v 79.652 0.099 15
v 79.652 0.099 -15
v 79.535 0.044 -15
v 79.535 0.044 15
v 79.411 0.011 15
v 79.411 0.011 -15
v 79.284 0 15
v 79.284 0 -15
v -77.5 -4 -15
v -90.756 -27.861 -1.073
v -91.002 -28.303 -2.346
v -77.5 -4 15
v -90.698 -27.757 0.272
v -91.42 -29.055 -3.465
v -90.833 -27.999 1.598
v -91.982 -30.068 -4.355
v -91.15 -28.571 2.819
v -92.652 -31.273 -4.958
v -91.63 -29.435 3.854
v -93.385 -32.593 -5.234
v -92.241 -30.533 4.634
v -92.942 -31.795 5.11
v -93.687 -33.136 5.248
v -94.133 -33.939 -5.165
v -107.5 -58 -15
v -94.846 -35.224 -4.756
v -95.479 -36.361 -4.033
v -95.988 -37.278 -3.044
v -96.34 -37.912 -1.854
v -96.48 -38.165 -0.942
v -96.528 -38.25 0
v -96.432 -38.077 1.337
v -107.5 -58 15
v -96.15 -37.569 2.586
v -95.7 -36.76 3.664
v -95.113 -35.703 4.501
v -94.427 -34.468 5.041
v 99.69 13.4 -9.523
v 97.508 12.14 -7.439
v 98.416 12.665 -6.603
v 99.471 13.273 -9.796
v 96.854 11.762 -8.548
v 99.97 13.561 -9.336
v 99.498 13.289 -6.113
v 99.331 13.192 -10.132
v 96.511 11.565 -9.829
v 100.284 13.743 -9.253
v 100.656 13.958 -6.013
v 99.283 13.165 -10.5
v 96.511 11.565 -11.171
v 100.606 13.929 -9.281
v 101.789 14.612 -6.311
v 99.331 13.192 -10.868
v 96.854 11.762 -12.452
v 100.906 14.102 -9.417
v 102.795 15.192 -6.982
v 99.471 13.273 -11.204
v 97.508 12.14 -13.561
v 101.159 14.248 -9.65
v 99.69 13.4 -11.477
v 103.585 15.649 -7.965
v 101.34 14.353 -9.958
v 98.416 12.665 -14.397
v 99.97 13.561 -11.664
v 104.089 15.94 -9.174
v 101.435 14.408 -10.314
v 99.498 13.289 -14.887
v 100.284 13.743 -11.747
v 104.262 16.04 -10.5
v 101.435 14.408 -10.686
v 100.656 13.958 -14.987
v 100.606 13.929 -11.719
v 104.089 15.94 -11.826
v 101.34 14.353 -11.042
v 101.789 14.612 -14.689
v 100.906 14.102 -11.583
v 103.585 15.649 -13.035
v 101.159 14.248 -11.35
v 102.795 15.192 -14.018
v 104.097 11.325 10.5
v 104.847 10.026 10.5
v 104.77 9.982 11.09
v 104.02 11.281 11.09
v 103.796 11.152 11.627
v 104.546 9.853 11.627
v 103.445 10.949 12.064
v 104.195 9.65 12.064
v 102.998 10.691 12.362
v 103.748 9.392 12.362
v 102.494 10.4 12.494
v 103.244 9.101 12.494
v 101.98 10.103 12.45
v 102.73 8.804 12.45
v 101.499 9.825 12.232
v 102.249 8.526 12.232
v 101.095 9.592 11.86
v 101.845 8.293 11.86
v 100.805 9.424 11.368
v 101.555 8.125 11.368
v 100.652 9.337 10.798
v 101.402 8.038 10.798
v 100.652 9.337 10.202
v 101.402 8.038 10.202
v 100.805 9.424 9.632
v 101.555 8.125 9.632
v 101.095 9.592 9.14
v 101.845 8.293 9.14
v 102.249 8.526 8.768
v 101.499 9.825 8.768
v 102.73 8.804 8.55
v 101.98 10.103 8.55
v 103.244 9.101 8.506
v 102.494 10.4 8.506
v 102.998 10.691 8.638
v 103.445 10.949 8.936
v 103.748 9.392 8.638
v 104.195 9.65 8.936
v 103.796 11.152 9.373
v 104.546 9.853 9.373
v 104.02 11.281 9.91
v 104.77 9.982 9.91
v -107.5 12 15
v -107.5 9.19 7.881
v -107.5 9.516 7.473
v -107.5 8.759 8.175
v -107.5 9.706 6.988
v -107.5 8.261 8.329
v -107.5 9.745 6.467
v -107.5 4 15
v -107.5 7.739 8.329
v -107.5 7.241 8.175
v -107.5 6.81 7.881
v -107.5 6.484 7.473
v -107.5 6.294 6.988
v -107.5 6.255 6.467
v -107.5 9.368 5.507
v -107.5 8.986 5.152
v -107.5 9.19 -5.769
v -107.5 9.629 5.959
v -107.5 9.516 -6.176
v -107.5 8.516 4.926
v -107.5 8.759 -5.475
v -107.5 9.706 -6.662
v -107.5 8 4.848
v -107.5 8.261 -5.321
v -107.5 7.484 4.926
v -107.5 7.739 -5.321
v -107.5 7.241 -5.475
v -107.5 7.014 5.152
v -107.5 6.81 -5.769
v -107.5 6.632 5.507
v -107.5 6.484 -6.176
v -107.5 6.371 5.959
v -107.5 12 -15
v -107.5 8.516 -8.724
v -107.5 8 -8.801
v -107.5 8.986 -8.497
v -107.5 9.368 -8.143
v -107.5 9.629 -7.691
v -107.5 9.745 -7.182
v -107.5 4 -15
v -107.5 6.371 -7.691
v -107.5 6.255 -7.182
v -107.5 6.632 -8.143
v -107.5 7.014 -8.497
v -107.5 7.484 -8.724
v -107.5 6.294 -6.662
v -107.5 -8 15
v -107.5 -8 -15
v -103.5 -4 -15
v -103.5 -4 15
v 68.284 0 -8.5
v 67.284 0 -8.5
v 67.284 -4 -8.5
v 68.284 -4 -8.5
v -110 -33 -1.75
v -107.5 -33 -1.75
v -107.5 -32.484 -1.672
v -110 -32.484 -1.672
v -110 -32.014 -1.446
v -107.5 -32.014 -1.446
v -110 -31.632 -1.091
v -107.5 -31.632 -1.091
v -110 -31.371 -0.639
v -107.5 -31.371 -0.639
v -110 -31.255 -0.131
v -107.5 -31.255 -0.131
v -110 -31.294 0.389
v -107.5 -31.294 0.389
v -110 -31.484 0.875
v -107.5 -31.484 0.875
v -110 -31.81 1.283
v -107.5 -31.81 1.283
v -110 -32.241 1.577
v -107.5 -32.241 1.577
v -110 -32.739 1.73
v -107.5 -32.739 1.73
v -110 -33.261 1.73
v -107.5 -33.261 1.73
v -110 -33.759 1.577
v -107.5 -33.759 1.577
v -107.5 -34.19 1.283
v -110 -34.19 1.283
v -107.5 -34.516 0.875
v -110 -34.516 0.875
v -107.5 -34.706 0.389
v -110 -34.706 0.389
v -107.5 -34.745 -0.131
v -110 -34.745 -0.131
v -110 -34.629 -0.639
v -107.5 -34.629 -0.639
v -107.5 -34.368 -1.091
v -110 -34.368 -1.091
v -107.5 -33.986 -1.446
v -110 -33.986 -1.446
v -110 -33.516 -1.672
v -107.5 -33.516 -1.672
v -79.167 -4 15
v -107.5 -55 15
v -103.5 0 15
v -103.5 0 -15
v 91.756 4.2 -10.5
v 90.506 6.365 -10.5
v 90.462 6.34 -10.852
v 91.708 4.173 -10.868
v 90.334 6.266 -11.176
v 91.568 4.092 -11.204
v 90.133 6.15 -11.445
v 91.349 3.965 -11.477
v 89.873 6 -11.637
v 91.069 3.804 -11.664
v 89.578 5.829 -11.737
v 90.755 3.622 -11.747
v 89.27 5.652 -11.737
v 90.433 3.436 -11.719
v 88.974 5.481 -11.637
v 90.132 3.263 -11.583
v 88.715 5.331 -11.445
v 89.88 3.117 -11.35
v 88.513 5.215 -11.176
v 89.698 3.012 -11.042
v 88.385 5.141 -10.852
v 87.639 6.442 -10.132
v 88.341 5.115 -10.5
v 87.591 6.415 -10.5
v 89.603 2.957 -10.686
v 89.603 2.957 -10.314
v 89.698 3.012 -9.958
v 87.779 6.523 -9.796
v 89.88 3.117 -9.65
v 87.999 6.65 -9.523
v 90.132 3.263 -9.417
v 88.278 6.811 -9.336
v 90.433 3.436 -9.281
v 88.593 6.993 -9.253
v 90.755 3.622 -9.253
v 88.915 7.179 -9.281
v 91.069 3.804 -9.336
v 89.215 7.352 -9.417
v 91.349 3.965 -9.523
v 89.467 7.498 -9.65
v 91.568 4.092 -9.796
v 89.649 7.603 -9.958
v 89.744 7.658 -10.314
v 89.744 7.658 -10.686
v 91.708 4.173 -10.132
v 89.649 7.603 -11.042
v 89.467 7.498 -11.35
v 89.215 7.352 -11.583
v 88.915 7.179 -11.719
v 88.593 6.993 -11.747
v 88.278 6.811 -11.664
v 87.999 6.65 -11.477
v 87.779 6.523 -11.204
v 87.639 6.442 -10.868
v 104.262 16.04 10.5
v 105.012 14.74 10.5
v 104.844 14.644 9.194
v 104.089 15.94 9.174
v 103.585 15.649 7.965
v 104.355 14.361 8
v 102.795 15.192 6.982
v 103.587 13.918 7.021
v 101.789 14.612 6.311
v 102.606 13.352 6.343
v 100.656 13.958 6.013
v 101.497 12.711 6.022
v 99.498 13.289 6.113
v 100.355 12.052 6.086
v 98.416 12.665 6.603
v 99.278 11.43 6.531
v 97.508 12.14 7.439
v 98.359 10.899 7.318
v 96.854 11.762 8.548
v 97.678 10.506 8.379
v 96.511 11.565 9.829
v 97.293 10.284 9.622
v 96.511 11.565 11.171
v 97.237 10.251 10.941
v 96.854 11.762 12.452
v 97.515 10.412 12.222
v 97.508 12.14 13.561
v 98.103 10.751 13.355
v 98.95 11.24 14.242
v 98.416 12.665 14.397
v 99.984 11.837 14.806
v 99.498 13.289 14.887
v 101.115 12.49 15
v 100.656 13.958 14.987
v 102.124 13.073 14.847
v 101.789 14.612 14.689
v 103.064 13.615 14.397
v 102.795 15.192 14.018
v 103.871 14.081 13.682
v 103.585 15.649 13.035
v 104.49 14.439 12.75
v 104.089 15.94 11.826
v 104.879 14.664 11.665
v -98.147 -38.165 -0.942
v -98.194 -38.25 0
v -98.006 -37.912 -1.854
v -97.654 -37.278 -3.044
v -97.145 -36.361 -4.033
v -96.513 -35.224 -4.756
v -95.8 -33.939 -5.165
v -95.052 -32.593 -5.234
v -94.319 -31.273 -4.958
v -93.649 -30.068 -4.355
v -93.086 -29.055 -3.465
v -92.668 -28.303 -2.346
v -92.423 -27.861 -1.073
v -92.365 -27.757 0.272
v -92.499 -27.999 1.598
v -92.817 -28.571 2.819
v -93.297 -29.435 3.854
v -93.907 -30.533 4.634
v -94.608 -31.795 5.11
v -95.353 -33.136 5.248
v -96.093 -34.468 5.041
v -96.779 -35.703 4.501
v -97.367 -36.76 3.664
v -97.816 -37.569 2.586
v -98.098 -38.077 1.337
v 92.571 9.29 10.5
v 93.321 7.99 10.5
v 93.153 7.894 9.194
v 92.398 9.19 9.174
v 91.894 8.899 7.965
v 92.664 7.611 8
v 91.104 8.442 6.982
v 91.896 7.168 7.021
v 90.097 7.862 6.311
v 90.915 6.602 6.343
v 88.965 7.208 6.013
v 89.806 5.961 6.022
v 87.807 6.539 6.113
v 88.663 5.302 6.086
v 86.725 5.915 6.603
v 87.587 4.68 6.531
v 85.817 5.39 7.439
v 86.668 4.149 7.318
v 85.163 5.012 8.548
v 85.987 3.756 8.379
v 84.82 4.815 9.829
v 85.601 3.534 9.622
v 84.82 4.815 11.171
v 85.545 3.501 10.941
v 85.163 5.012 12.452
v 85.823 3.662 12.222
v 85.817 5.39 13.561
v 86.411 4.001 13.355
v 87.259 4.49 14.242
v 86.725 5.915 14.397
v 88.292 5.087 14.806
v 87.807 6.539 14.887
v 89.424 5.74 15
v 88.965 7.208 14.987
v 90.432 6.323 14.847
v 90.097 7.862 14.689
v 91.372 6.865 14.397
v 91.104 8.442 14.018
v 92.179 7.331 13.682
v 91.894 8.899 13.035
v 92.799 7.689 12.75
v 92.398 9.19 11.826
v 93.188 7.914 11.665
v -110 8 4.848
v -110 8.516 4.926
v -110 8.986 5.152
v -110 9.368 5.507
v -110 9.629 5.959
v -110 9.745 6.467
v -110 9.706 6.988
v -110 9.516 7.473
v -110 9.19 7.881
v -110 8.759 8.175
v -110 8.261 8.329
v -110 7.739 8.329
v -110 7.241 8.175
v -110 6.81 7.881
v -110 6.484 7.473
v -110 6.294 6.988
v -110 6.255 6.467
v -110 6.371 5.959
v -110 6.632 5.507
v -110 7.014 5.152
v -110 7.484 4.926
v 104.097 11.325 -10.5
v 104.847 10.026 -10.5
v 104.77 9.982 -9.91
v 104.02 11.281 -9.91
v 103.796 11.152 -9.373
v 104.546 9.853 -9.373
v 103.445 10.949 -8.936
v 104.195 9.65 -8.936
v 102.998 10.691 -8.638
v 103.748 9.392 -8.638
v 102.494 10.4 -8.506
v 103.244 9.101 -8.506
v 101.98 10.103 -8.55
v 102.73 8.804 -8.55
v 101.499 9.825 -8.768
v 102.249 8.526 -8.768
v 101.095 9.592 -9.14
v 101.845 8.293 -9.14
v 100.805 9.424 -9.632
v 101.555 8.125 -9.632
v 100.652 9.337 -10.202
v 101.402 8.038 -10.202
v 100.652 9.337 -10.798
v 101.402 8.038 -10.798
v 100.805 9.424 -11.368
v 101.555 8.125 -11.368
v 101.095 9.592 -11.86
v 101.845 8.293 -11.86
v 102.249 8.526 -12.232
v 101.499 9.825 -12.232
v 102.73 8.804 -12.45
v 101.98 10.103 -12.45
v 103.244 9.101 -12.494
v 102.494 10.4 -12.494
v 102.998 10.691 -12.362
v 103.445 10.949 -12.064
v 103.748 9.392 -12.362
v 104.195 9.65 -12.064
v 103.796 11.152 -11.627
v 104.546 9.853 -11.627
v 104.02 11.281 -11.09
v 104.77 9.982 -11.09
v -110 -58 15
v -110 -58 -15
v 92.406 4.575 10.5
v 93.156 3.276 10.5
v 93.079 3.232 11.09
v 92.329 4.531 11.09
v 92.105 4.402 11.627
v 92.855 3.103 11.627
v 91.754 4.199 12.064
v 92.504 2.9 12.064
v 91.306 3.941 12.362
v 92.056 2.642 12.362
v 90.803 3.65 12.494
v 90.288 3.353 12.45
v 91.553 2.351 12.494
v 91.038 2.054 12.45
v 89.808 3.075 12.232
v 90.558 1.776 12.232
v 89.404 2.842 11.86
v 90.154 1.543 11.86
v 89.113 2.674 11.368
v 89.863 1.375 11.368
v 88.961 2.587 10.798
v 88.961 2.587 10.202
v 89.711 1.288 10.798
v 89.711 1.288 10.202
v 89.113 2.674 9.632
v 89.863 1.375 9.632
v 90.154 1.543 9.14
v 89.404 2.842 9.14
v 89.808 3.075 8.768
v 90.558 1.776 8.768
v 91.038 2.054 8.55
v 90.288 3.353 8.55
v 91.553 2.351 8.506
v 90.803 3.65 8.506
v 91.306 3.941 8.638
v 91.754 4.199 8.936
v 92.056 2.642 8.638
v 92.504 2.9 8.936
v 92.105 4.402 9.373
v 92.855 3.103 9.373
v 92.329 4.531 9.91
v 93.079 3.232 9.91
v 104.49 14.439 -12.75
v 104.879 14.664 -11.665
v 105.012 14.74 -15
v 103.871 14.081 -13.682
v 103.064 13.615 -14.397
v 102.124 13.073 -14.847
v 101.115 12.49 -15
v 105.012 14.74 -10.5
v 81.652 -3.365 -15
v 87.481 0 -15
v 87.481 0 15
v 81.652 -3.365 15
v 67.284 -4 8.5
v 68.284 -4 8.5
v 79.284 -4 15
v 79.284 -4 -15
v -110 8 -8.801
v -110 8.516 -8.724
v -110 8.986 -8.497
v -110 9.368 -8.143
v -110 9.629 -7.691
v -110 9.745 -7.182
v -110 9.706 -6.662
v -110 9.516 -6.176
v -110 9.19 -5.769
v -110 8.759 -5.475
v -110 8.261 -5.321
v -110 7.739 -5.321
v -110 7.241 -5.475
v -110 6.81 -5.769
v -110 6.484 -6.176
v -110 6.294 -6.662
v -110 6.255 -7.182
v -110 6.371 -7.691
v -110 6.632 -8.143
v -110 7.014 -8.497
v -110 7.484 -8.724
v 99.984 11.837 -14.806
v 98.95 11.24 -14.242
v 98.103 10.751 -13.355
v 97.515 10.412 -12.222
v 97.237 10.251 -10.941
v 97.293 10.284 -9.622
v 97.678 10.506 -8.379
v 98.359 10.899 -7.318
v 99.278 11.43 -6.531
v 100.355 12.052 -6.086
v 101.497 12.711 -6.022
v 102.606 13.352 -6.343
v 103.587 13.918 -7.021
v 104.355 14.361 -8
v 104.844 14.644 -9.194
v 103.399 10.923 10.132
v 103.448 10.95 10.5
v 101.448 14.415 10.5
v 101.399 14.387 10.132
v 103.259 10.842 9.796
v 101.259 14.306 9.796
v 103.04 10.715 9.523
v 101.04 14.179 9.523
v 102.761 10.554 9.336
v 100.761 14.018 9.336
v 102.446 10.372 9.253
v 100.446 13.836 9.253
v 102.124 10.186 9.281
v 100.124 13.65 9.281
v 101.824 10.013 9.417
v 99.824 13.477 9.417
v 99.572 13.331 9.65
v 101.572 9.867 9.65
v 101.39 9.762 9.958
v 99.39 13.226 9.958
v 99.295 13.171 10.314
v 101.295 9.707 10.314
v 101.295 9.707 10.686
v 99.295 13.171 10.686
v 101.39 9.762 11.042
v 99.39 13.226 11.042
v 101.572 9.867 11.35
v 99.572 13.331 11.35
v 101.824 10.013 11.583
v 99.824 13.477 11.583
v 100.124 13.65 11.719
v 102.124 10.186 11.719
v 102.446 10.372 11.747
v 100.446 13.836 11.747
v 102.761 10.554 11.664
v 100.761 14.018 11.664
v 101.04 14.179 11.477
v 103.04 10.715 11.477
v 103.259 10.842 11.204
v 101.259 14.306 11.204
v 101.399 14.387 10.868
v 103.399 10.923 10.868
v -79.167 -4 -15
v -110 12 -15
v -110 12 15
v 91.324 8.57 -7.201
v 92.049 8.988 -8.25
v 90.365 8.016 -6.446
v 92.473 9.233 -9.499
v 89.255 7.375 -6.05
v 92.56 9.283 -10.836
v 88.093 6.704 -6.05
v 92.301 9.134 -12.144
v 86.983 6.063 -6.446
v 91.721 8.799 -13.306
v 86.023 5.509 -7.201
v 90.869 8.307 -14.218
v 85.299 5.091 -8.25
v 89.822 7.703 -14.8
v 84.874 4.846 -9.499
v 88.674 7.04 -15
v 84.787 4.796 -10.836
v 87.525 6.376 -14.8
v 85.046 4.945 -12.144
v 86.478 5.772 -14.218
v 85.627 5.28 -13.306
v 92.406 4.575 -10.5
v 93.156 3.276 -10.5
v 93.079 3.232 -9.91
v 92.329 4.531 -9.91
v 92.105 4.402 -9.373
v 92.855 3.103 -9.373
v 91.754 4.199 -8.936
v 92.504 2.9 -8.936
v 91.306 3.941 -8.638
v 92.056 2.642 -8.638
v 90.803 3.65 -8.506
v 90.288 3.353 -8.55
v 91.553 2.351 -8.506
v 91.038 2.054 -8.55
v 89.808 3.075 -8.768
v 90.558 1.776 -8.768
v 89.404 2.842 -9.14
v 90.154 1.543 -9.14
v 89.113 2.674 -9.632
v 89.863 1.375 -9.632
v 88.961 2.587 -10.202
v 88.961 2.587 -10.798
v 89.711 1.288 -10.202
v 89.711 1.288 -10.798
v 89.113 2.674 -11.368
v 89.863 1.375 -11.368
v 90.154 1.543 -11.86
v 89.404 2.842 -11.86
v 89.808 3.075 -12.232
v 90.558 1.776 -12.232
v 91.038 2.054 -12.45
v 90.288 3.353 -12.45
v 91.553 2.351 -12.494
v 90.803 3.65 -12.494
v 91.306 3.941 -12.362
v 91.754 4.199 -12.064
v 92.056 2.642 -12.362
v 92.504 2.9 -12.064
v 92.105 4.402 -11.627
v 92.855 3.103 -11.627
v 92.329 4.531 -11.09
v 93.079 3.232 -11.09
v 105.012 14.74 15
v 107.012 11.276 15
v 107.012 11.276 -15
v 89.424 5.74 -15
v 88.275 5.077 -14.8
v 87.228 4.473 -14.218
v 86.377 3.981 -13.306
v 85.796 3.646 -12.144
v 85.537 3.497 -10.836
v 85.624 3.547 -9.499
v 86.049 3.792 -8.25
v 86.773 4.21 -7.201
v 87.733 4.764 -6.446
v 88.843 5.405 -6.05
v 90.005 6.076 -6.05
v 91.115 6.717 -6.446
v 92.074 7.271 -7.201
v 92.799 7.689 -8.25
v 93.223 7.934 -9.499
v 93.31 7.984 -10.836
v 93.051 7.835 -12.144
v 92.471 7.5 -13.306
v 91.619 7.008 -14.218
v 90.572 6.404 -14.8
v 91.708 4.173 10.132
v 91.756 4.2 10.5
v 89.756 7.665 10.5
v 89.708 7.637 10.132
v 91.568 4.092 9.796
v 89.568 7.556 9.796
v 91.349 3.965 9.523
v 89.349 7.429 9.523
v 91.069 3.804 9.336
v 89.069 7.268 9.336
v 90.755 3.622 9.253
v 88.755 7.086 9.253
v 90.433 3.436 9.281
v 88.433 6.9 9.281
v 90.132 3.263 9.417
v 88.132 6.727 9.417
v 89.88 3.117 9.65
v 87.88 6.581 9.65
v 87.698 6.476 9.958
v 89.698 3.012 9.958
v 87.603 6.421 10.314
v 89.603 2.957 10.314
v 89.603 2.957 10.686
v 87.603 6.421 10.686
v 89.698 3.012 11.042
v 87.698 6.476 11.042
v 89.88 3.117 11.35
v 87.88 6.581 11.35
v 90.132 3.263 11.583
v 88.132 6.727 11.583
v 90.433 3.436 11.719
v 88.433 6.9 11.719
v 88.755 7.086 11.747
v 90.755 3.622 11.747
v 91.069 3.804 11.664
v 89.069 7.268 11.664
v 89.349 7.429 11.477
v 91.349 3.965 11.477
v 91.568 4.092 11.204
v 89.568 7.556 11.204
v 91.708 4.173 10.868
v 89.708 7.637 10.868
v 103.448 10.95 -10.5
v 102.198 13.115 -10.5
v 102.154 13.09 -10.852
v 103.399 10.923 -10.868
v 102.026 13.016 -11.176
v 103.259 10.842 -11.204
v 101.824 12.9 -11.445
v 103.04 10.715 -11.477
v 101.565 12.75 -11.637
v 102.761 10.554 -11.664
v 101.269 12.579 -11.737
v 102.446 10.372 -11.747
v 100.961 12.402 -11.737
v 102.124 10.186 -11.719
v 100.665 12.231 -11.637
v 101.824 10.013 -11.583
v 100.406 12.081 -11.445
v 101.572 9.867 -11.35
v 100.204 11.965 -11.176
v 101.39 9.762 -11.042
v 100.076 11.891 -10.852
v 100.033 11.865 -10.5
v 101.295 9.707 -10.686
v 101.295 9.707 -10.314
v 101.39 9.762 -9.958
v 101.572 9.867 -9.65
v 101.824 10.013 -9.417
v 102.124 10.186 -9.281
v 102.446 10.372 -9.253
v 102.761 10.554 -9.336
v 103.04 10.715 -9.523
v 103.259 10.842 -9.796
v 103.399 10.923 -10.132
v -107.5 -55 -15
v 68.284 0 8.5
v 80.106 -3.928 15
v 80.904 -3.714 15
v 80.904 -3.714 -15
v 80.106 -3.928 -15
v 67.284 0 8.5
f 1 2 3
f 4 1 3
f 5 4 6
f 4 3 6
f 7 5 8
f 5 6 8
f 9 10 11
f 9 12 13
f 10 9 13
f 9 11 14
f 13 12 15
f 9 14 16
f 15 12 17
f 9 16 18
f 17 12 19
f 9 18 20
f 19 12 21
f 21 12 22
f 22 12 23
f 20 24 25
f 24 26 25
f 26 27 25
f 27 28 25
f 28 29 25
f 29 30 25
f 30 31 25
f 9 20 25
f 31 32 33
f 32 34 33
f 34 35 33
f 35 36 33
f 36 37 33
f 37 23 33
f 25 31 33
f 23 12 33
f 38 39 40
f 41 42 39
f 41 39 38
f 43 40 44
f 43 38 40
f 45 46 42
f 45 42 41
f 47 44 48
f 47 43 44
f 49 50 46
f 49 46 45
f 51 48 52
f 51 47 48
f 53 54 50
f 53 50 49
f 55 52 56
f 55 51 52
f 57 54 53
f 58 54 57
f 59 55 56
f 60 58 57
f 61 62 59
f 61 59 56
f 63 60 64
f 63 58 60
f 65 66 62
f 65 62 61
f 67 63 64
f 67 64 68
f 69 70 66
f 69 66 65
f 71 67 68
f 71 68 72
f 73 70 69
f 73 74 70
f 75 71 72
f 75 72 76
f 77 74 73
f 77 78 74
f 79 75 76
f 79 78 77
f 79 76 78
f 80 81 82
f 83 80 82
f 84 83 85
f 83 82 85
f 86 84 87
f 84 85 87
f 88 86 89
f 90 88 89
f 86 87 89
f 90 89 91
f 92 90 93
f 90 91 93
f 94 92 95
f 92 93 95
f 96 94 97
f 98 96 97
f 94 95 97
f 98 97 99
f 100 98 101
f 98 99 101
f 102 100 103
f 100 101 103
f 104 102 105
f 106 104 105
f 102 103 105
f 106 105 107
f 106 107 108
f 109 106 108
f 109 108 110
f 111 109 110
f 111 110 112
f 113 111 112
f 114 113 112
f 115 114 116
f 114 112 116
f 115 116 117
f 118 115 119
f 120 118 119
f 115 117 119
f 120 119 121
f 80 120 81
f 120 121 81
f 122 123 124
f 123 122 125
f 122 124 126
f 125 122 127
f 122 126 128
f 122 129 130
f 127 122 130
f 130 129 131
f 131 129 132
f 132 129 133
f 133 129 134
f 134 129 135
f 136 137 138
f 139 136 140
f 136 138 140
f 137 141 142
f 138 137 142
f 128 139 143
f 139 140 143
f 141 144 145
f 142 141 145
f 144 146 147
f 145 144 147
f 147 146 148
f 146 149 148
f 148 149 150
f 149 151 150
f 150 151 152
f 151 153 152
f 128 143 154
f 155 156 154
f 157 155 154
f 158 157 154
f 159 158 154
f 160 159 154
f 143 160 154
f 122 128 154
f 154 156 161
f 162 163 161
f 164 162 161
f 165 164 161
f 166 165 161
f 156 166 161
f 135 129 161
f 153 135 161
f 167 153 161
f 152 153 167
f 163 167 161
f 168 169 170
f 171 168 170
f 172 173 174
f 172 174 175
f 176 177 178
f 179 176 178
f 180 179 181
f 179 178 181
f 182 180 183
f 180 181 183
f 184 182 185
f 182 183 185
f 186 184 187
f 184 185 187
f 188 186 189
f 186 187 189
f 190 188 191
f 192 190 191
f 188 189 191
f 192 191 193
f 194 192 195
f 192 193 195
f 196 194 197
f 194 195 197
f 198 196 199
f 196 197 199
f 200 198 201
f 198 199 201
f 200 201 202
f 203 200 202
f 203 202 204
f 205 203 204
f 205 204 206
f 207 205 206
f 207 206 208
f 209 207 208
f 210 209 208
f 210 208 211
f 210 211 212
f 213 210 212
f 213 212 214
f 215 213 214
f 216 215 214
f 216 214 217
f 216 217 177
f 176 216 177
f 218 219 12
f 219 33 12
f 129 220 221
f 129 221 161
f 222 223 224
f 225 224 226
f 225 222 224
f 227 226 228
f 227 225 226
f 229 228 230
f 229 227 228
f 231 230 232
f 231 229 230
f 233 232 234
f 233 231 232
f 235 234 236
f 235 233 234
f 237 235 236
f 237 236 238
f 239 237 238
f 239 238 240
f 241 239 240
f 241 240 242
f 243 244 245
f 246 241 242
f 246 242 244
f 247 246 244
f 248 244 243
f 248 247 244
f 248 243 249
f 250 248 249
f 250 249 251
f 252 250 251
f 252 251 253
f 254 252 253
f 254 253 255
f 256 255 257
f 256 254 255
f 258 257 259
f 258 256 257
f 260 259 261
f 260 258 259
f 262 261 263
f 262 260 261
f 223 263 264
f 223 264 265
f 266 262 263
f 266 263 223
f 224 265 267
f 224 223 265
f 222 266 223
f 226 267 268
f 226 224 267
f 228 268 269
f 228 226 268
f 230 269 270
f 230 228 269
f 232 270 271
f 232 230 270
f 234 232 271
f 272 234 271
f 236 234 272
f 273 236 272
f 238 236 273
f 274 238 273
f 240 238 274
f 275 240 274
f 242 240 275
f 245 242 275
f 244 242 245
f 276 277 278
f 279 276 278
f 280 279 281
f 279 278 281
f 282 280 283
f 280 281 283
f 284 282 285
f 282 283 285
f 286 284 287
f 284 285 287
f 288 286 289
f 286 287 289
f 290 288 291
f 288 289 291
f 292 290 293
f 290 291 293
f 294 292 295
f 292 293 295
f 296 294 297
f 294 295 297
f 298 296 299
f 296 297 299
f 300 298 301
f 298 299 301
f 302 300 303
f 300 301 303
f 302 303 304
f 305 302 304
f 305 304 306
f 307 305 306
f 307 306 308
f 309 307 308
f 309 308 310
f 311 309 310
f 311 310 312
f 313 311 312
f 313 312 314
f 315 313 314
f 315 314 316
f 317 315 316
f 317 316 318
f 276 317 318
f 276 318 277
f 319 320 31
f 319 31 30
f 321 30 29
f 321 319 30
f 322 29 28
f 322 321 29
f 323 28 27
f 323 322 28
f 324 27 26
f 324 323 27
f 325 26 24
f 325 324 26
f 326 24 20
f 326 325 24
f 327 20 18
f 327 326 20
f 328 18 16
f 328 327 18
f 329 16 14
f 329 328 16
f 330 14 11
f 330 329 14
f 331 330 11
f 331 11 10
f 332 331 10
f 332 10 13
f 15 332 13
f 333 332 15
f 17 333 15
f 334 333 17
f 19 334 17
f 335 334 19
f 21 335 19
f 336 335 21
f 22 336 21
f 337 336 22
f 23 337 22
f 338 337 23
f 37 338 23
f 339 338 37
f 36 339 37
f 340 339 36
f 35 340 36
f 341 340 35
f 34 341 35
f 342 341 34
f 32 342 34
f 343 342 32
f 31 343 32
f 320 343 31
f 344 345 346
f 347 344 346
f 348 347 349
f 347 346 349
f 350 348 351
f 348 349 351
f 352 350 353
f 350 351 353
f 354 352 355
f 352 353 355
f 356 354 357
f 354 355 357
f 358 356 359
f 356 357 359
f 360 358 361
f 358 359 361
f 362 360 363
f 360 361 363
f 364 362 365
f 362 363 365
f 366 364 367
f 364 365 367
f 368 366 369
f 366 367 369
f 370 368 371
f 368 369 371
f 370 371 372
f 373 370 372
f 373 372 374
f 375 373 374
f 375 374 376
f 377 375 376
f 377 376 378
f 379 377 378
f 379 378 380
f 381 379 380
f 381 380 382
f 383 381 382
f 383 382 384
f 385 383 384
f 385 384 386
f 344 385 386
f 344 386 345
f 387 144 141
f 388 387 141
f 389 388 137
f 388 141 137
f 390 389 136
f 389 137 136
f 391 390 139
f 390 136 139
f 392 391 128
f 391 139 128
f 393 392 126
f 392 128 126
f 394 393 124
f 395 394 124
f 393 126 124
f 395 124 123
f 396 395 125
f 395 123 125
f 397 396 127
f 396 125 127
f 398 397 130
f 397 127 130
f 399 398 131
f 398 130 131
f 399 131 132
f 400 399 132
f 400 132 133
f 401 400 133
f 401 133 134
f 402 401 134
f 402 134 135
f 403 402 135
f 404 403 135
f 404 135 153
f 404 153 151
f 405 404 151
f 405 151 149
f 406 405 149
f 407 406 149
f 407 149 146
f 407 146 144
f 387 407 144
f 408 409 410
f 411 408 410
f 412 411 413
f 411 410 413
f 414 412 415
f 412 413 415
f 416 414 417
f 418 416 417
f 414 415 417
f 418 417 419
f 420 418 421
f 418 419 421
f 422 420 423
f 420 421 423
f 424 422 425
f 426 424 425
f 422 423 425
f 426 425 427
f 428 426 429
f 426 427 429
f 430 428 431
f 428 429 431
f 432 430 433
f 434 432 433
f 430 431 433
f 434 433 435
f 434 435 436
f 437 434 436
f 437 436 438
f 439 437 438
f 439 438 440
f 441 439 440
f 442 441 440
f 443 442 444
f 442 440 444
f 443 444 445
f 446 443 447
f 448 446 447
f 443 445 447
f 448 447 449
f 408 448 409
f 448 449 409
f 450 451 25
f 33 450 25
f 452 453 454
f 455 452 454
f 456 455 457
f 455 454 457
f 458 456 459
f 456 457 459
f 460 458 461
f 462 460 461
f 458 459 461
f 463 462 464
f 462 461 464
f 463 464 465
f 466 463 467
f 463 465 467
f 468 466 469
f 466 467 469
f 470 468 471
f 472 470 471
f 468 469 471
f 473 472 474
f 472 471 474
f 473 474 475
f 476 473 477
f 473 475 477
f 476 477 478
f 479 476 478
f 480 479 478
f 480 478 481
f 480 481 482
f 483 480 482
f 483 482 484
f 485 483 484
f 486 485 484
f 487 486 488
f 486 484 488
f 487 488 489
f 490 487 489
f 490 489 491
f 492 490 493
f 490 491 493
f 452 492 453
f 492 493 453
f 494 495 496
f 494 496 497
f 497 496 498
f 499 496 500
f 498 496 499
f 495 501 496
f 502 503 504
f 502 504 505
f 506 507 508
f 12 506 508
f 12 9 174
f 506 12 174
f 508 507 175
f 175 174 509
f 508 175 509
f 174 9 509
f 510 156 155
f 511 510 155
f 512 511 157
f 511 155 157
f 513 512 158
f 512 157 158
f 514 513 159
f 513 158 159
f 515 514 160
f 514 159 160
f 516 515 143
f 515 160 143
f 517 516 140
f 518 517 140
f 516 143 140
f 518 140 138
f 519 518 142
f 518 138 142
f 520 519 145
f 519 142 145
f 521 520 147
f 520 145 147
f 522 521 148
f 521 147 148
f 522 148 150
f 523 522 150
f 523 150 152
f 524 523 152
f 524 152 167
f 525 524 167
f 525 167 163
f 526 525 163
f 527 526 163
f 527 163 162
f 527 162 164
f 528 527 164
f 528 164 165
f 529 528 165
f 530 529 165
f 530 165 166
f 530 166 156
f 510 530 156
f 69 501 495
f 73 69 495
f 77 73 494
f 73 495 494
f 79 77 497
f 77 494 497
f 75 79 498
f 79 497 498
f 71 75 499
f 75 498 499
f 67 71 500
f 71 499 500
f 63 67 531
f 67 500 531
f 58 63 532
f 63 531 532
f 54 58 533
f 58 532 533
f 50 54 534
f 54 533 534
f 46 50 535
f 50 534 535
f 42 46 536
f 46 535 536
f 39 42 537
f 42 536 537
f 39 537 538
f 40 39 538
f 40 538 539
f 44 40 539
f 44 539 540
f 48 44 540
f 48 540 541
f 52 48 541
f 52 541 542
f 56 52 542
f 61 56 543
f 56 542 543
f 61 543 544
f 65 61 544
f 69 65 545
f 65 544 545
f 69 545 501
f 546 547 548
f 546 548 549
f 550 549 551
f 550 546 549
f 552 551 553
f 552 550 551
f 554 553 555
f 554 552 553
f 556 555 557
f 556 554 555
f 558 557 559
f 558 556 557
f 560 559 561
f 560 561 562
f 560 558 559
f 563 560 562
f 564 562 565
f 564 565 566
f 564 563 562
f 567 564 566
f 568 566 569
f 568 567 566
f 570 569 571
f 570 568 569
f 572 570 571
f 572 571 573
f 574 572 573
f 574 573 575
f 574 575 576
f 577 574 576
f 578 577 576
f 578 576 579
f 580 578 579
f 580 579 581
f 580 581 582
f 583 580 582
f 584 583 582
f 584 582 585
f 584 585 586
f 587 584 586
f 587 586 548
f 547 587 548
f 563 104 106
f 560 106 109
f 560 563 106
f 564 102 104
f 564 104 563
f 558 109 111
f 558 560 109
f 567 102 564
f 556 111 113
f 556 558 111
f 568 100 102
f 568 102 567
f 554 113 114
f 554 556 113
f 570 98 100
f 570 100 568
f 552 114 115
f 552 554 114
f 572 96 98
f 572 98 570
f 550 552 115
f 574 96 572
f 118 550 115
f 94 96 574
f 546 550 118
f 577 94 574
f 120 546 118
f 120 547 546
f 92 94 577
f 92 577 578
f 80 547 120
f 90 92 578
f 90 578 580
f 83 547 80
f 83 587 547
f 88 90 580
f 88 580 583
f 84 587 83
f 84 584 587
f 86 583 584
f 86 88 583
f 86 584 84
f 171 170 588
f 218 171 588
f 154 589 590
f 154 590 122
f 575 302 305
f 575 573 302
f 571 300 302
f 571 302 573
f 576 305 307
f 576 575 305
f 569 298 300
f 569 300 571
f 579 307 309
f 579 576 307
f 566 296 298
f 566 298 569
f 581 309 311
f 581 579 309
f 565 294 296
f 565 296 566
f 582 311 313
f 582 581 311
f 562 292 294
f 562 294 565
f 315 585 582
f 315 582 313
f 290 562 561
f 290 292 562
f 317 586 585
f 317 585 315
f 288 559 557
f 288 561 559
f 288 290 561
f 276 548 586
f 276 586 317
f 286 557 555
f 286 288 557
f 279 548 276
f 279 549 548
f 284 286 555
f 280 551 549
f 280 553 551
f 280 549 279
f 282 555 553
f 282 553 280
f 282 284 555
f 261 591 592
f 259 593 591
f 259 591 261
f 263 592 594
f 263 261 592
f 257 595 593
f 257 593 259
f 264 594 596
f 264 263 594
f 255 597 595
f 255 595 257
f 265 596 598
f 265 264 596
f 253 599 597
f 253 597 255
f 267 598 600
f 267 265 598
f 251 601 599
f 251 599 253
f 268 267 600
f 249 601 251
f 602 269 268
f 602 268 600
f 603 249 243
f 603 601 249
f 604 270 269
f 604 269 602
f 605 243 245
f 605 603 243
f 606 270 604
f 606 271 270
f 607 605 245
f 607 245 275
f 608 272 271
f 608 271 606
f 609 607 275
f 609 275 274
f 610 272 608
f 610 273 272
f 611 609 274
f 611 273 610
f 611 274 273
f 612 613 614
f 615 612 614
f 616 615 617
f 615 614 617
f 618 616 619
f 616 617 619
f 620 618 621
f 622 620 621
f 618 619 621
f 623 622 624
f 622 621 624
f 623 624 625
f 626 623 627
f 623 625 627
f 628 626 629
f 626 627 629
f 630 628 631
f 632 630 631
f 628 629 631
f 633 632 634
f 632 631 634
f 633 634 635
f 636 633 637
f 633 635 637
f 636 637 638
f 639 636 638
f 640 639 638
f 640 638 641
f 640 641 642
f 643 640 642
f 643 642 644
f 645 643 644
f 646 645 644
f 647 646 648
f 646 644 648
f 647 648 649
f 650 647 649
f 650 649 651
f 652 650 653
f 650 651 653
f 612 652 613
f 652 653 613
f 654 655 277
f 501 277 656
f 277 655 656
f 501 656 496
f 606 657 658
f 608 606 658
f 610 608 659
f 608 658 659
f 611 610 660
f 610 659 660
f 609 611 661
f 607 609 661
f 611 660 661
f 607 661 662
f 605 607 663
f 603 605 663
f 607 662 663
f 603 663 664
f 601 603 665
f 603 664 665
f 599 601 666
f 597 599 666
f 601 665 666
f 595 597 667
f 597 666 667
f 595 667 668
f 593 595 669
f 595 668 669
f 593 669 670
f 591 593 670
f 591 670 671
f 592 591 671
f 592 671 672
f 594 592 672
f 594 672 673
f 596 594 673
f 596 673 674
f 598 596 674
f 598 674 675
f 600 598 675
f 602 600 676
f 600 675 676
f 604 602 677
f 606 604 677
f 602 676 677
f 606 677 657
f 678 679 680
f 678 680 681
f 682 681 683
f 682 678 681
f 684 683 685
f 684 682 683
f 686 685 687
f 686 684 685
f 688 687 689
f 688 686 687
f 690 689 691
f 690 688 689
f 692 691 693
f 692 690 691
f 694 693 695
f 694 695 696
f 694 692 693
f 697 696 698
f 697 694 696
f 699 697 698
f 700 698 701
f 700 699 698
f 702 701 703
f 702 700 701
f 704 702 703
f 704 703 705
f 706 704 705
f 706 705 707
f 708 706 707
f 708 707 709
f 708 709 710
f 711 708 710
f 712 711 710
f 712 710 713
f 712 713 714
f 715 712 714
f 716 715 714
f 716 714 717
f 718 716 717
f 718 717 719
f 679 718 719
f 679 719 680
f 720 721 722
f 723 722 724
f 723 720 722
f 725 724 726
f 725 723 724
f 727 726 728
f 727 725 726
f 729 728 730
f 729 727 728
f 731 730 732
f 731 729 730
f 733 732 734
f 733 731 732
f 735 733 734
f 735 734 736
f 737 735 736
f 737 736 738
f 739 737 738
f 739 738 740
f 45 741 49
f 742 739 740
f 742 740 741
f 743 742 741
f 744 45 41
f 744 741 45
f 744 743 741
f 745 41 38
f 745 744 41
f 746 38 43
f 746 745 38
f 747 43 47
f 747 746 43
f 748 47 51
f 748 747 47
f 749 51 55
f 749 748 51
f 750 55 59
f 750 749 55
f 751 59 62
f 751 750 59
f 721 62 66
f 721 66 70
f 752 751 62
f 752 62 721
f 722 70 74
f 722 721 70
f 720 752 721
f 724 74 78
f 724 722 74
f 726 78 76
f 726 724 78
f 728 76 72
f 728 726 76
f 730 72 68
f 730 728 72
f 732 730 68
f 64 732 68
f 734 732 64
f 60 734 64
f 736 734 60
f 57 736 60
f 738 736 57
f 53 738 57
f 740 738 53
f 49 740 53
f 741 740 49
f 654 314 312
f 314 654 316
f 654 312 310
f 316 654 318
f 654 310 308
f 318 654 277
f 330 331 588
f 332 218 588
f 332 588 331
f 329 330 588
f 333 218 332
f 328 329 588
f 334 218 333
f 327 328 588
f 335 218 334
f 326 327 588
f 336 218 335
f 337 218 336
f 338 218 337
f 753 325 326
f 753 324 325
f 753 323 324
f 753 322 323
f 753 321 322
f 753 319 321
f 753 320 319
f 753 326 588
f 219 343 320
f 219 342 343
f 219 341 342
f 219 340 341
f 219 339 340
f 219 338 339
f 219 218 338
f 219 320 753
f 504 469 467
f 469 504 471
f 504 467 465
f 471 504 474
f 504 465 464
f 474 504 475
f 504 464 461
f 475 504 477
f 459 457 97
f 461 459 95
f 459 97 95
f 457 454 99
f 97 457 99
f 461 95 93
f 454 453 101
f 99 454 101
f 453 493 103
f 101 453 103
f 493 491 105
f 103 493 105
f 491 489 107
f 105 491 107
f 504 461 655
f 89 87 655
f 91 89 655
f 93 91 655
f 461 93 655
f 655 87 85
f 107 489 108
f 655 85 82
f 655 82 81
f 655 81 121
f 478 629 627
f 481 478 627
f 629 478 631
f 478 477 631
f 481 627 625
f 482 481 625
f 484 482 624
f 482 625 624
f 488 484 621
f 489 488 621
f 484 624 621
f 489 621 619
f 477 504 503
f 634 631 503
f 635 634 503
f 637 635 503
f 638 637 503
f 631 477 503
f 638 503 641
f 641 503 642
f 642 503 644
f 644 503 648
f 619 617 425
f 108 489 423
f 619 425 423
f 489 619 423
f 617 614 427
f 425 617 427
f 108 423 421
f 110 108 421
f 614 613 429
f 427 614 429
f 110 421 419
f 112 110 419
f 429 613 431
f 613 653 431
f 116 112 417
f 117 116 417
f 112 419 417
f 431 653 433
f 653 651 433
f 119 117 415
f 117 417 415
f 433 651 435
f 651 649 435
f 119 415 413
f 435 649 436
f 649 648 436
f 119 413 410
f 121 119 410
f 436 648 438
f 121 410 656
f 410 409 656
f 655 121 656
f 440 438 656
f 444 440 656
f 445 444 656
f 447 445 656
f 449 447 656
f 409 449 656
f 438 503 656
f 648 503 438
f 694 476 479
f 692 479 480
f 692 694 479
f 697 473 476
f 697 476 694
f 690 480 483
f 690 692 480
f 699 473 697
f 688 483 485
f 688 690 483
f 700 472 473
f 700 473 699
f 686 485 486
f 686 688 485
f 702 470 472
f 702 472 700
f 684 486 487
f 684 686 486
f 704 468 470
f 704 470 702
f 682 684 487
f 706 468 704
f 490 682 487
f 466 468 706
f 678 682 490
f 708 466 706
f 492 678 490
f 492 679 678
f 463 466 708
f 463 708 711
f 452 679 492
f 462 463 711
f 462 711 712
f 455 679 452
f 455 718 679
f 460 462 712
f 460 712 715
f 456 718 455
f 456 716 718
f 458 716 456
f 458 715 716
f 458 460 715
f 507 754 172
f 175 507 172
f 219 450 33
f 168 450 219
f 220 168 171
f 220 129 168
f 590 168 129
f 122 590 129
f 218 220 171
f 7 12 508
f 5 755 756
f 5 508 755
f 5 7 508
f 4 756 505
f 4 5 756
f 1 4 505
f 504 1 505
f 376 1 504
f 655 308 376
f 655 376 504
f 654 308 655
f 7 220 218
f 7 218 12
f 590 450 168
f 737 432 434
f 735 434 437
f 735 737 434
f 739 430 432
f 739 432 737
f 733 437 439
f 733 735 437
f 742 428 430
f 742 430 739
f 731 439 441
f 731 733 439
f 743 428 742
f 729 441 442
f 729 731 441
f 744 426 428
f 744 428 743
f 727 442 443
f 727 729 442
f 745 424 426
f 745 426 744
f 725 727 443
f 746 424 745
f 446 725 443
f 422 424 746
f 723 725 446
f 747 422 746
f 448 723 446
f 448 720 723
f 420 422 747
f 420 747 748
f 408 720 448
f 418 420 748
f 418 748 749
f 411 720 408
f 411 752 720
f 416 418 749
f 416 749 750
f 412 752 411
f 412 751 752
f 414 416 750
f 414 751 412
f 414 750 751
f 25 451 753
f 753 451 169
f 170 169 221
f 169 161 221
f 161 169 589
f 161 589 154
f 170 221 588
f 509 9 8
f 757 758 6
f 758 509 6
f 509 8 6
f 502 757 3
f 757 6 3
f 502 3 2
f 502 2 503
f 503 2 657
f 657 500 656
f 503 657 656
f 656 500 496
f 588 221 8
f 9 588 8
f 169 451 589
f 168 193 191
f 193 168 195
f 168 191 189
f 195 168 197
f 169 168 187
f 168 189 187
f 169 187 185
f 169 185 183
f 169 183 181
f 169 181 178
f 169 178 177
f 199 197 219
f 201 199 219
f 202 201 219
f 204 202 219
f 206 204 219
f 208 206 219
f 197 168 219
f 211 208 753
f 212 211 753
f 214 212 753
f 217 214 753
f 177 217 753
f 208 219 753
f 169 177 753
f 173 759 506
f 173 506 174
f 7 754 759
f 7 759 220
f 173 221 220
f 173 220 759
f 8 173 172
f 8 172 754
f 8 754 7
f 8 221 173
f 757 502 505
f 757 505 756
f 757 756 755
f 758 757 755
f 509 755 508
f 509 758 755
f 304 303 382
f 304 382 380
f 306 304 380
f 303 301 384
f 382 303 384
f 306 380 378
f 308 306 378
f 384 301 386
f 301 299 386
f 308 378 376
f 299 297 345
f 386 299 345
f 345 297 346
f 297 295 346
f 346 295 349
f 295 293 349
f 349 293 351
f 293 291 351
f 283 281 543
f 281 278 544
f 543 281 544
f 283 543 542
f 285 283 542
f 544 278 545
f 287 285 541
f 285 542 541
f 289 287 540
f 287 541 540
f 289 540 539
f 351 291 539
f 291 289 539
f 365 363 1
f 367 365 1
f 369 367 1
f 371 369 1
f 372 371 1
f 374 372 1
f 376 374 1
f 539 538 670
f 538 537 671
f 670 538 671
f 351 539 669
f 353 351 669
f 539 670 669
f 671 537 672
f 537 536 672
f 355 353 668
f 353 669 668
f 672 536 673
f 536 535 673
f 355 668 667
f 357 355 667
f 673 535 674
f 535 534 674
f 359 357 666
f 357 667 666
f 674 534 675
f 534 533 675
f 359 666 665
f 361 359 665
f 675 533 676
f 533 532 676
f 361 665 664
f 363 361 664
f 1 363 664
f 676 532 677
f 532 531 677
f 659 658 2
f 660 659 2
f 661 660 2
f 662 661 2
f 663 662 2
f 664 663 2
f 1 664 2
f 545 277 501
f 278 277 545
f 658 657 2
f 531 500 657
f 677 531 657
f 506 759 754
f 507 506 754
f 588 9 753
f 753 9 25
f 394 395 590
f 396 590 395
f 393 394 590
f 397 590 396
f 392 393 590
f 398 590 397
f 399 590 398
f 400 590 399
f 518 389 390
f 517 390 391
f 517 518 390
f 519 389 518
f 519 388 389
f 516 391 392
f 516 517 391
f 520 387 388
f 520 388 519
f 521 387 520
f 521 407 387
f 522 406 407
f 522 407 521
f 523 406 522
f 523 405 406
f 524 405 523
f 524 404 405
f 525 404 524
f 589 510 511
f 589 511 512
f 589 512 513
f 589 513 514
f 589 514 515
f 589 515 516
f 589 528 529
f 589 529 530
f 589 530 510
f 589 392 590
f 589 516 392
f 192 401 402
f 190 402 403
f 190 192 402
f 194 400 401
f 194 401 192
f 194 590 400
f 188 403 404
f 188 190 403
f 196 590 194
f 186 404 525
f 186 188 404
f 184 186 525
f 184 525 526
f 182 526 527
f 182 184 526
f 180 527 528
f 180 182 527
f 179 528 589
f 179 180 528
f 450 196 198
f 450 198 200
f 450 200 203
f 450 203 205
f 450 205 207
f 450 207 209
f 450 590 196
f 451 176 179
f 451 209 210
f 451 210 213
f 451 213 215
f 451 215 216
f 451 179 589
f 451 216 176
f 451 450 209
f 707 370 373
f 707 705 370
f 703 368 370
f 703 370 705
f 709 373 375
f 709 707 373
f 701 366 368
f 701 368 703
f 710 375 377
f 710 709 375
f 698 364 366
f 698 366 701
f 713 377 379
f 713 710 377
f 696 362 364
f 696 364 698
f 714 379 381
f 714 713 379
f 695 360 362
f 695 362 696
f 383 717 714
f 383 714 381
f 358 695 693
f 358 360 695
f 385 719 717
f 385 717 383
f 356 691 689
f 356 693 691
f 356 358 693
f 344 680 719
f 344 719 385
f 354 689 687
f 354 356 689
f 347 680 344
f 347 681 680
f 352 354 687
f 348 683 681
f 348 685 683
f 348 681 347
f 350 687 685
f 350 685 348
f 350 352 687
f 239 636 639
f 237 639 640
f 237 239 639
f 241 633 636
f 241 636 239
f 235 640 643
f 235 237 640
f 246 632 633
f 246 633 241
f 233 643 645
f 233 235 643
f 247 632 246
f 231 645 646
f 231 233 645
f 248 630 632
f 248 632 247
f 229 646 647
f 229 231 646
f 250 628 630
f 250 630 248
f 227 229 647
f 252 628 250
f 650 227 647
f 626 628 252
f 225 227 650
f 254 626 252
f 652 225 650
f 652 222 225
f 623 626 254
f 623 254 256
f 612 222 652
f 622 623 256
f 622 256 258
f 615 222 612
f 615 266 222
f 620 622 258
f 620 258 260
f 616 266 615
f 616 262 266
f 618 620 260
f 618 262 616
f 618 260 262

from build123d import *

# Parameters (mm, degrees)
ESQUISSE2_W                 = 220
ESQUISSE2_H                 = 30
T_LE_DE_BASE_PLI_E1_DEPTH   = 4
PLI_START                   = -15
PLI_ESQUISS_1_DEPTH         = 30
PLI_ESQUISS_1_2_DEPTH       = 30
ESQUISSE9_R                 = 4.5
ESQUISSE9_R_2               = 1.25
BOSS_EXTRU_1_DEPTH          = 1.5
ENL_V_START                 = -4
ENL_V_MAT_EXTRU_1_OUTLINE_R = 1.25
ENL_V_MAT_EXTRU_1_DEPTH     = 4
BOSS_EXTRU_2_DEPTH          = 12
BOSS_EXTRU_2_DEPTH_BACK     = 58
ESQUISSE11_W                = 2.5
ESQUISSE11_H                = 30
BOSS_EXTRU_3_DEPTH          = 3
ESQUISSE13_R                = 2
ENL_V_MAT_EXTRU_2_DEPTH     = 1.5
ENL_V_MAT_EXTRU_3_REACH     = 127.256
ESQUISSE14_W                = 1
ESQUISSE14_H                = 17
ESQUISSE12_R                = 1.75
ENL_V_MAT_EXTRU_4_DEPTH     = 223.720608774
ESQUISSE12_7_R              = 5.25
ESQUISSE12_7_R_2            = 1.75
ENL_V_MAT_EXTRU_5_DEPTH     = 223.720608774
BOSS_EXTRU_4_START          = -15
BOSS_EXTRU_4_DEPTH          = 30


# Read off the part's stored shape, not the designer's step: Pli esquissé1, Enlèv. mat.-Extru.1, Boss.-Extru.4
# Sheet-metal steps are written as plain solids
with BuildPart() as part:
    # Esquisse2 → Tôle de base pliée1 (new body)
    with BuildSketch(Plane(origin=(0, 0, 0), x_dir=(1, 0, 0), z_dir=(0, 1, 0))):
        Rectangle(ESQUISSE2_W, ESQUISSE2_H)
    extrude(amount=-T_LE_DE_BASE_PLI_E1_DEPTH)

    # Pli esquissé1 outline → Pli esquissé1 (cut)
    with BuildSketch(Plane.XY.offset(PLI_START)):
        with BuildLine():
            Line((110, 0), (87.480931171, 0))
            Line((87.480931171, 0), (81.651859795, -3.365415928))
            ThreePointArc((81.651859795, -3.365415928), (80.509482084, -3.838604269), (79.283559795, -4))
            Line((79.283559795, -4), (110, -4))
            Line((110, -4), (110, 0))
        make_face()
    extrude(amount=PLI_ESQUISS_1_DEPTH, mode=Mode.SUBTRACT)

    # Pli esquiss_1 2 outline → Pli esquiss_1 2 (add)
    with BuildSketch(Plane.XY.offset(PLI_START)):
        with BuildLine():
            Line((87.480931171, 0), (107.012166491, 11.27636397))
            Line((107.012166491, 11.27636397), (105.012166491, 14.740465585))
            Line((105.012166491, 14.740465585), (79.651859795, 0.098685688))
            ThreePointArc((79.651859795, 0.098685688), (79.474205904, 0.025099036), (79.283559795, 0))
            Line((79.283559795, 0), (87.480931171, 0))
        make_face()
    extrude(amount=PLI_ESQUISS_1_2_DEPTH)

    # Esquisse9 → Boss.-Extru.1 (add)
    # profile 1 of 4: a face of its own
    with BuildSketch(Plane(origin=(19.870232793, -34.416252755, 0), x_dir=(0.8660254037844382, 0.5000000000000011, 0), z_dir=(-0.5000000000000011, 0.8660254037844382, 0))):
        with Locations(Location((80.313436681, 10.5, 0), (0, 0, 90))):
            Circle(ESQUISSE9_R)
        with Locations(Location((80.313436681, 10.5, 0), (0, 0, 180))):
            Circle(ESQUISSE9_R_2, mode=Mode.SUBTRACT)
    # profile 2 of 4: a face of its own
    with BuildSketch(Plane(origin=(19.870232793, -34.416252755, 0), x_dir=(0.8660254037844382, 0.5000000000000011, 0), z_dir=(-0.5000000000000011, 0.8660254037844382, 0))):
        with Locations((93.813436681, 10.5)):
            Circle(ESQUISSE9_R)
        with Locations(Location((93.813436681, 10.5, 0), (0, 0, 180))):
            Circle(ESQUISSE9_R_2, mode=Mode.SUBTRACT)
    # profile 3 of 4: a face of its own
    with BuildSketch(Plane(origin=(19.870232793, -34.416252755, 0), x_dir=(0.8660254037844382, 0.5000000000000011, 0), z_dir=(-0.5000000000000011, 0.8660254037844382, 0))):
        with Locations((93.813436681, -10.5)):
            Circle(ESQUISSE9_R)
        with Locations((93.813436681, -10.5)):
            Circle(ESQUISSE9_R_2, mode=Mode.SUBTRACT)
    # profile 4 of 4: a face of its own
    with BuildSketch(Plane(origin=(19.870232793, -34.416252755, 0), x_dir=(0.8660254037844382, 0.5000000000000011, 0), z_dir=(-0.5000000000000011, 0.8660254037844382, 0))):
        with Locations((80.313436681, -10.5)):
            Circle(ESQUISSE9_R)
        with Locations((80.313436681, -10.5)):
            Circle(ESQUISSE9_R_2, mode=Mode.SUBTRACT)
    extrude(amount=BOSS_EXTRU_1_DEPTH)

    # Enlèv. mat.-Extru.1 outline → Enlèv. mat.-Extru.1 (cut)
    with BuildSketch(Plane(origin=(19.870232793, -34.416252755, 0), x_dir=(0.8660254037844382, 0.5000000000000011, 0), z_dir=(-0.5000000000000011, 0.8660254037844382, 0)).offset(ENL_V_START)):
        with Locations((93.813436681, 10.5)):
            Circle(ENL_V_MAT_EXTRU_1_OUTLINE_R)
        with Locations((93.813436681, -10.5)):
            Circle(ENL_V_MAT_EXTRU_1_OUTLINE_R)
        with Locations((80.313436681, 10.5)):
            Circle(ENL_V_MAT_EXTRU_1_OUTLINE_R)
        with Locations((80.313436681, -10.5)):
            Circle(ENL_V_MAT_EXTRU_1_OUTLINE_R)
    extrude(amount=ENL_V_MAT_EXTRU_1_DEPTH, mode=Mode.SUBTRACT)

    # Esquisse11 → Boss.-Extru.2 (add, two sides: drawn at the far end of the back side and taken through both)
    with BuildSketch(Plane(origin=(0, 0, 0), x_dir=(1, 0, 0), z_dir=(0, 1, 0)).offset(-BOSS_EXTRU_2_DEPTH_BACK)):
        with Locations((-108.75, 0)):
            Rectangle(ESQUISSE11_W, ESQUISSE11_H)
    extrude(amount=BOSS_EXTRU_2_DEPTH + BOSS_EXTRU_2_DEPTH_BACK)

    # Esquisse3D1 → Boss.-Extru.3 (add, along a direction that is not the sketch's normal)
    with BuildSketch(Plane(origin=(-107.5, -58, -15), x_dir=(0.43685202833051884, 0.7863336509949341, 0.43685202833051917), z_dir=(0.8741572761215378, -0.4856429311786321, 0))):
        Polygon((0, 0), (13.10556085, 26.98600146), (68.673138854, 0), (55.567578004, -26.98600146), align=None)
    extrude(amount=-BOSS_EXTRU_3_DEPTH, dir=(0, -1, 0))

    # Esquisse13 → Enlèv. mat.-Extru.2 (cut)
    with BuildSketch(Plane(origin=(21.870232793, -37.88035437, 0), x_dir=(0.8660254037844382, 0.500000000000001, 0), z_dir=(0.500000000000001, -0.8660254037844382, 0))):
        with Locations((93.813436681, 10.5)):
            Circle(ESQUISSE13_R)
        with Locations((93.813436681, -10.5)):
            Circle(ESQUISSE13_R)
        with Locations((80.313436681, -10.5)):
            Circle(ESQUISSE13_R)
        with Locations((80.313436681, 10.5)):
            Circle(ESQUISSE13_R)
    extrude(amount=-ENL_V_MAT_EXTRU_2_DEPTH, mode=Mode.SUBTRACT)

    # Esquisse14 → Enlèv. mat.-Extru.3 (cut, up to next)
    with BuildSketch(Plane(origin=(0, 0, 0), x_dir=(1, 0, 0), z_dir=(0, 1, 0)), mode=Mode.PRIVATE) as enl_v_mat_extru_3_sk1:
        with Locations((67.783559795, 0)):
            Rectangle(ESQUISSE14_W, ESQUISSE14_H)
    enl_v_mat_extru_3_tool1 = extrude(enl_v_mat_extru_3_sk1.sketch, amount=-ENL_V_MAT_EXTRU_3_REACH, mode=Mode.PRIVATE) & part.part
    add(enl_v_mat_extru_3_tool1.solids().sort_by_distance((67.78356, 0, 0))[0], mode=Mode.SUBTRACT)

    # Esquisse12 → Enlèv. mat.-Extru.4 (cut, through all)
    with BuildSketch(Plane(origin=(-107.5, 0, 0), x_dir=(0, 0, -1), z_dir=(1, 0, 0))):
        with Locations((0, -33)):
            Circle(ESQUISSE12_R)
        with Locations((-6.598263909, 8)):
            Circle(ESQUISSE12_R)
        with Locations((7.051423878, 8)):
            Circle(ESQUISSE12_R)
    extrude(amount=-ENL_V_MAT_EXTRU_4_DEPTH, mode=Mode.SUBTRACT)

    # Esquisse12<7> → Enlèv. mat.-Extru.5 (cut, through all)
    # profile 1 of 2: a face of its own
    with BuildSketch(Plane(origin=(-107.5, 0, 0), x_dir=(0, 0, -1), z_dir=(1, 0, 0))):
        with Locations(Location((0, -33, 0), (0, 0, 270))):
            Circle(ESQUISSE12_7_R)
        with Locations((0, -33)):
            Circle(ESQUISSE12_7_R_2, mode=Mode.SUBTRACT)
    # profile 2 of 2: a face of its own
    with BuildSketch(Plane(origin=(-107.5, 0, 0), x_dir=(0, 0, -1), z_dir=(1, 0, 0))):
        with Locations(Location((0, -33, 0), (0, 0, 270))):
            Circle(ESQUISSE12_7_R)
    extrude(amount=ENL_V_MAT_EXTRU_5_DEPTH, mode=Mode.SUBTRACT)

    # Boss.-Extru.4 outline → Boss.-Extru.4 (add)
    with BuildSketch(Plane.XY.offset(BOSS_EXTRU_4_START)):
        Polygon((-107.5, -4), (-107.5, -8), (-103.5, -4), align=None)
        Polygon((-103.5, 0), (-107.5, 4), (-107.5, 0), align=None)
    extrude(amount=BOSS_EXTRU_4_DEPTH)


solid = part.part
